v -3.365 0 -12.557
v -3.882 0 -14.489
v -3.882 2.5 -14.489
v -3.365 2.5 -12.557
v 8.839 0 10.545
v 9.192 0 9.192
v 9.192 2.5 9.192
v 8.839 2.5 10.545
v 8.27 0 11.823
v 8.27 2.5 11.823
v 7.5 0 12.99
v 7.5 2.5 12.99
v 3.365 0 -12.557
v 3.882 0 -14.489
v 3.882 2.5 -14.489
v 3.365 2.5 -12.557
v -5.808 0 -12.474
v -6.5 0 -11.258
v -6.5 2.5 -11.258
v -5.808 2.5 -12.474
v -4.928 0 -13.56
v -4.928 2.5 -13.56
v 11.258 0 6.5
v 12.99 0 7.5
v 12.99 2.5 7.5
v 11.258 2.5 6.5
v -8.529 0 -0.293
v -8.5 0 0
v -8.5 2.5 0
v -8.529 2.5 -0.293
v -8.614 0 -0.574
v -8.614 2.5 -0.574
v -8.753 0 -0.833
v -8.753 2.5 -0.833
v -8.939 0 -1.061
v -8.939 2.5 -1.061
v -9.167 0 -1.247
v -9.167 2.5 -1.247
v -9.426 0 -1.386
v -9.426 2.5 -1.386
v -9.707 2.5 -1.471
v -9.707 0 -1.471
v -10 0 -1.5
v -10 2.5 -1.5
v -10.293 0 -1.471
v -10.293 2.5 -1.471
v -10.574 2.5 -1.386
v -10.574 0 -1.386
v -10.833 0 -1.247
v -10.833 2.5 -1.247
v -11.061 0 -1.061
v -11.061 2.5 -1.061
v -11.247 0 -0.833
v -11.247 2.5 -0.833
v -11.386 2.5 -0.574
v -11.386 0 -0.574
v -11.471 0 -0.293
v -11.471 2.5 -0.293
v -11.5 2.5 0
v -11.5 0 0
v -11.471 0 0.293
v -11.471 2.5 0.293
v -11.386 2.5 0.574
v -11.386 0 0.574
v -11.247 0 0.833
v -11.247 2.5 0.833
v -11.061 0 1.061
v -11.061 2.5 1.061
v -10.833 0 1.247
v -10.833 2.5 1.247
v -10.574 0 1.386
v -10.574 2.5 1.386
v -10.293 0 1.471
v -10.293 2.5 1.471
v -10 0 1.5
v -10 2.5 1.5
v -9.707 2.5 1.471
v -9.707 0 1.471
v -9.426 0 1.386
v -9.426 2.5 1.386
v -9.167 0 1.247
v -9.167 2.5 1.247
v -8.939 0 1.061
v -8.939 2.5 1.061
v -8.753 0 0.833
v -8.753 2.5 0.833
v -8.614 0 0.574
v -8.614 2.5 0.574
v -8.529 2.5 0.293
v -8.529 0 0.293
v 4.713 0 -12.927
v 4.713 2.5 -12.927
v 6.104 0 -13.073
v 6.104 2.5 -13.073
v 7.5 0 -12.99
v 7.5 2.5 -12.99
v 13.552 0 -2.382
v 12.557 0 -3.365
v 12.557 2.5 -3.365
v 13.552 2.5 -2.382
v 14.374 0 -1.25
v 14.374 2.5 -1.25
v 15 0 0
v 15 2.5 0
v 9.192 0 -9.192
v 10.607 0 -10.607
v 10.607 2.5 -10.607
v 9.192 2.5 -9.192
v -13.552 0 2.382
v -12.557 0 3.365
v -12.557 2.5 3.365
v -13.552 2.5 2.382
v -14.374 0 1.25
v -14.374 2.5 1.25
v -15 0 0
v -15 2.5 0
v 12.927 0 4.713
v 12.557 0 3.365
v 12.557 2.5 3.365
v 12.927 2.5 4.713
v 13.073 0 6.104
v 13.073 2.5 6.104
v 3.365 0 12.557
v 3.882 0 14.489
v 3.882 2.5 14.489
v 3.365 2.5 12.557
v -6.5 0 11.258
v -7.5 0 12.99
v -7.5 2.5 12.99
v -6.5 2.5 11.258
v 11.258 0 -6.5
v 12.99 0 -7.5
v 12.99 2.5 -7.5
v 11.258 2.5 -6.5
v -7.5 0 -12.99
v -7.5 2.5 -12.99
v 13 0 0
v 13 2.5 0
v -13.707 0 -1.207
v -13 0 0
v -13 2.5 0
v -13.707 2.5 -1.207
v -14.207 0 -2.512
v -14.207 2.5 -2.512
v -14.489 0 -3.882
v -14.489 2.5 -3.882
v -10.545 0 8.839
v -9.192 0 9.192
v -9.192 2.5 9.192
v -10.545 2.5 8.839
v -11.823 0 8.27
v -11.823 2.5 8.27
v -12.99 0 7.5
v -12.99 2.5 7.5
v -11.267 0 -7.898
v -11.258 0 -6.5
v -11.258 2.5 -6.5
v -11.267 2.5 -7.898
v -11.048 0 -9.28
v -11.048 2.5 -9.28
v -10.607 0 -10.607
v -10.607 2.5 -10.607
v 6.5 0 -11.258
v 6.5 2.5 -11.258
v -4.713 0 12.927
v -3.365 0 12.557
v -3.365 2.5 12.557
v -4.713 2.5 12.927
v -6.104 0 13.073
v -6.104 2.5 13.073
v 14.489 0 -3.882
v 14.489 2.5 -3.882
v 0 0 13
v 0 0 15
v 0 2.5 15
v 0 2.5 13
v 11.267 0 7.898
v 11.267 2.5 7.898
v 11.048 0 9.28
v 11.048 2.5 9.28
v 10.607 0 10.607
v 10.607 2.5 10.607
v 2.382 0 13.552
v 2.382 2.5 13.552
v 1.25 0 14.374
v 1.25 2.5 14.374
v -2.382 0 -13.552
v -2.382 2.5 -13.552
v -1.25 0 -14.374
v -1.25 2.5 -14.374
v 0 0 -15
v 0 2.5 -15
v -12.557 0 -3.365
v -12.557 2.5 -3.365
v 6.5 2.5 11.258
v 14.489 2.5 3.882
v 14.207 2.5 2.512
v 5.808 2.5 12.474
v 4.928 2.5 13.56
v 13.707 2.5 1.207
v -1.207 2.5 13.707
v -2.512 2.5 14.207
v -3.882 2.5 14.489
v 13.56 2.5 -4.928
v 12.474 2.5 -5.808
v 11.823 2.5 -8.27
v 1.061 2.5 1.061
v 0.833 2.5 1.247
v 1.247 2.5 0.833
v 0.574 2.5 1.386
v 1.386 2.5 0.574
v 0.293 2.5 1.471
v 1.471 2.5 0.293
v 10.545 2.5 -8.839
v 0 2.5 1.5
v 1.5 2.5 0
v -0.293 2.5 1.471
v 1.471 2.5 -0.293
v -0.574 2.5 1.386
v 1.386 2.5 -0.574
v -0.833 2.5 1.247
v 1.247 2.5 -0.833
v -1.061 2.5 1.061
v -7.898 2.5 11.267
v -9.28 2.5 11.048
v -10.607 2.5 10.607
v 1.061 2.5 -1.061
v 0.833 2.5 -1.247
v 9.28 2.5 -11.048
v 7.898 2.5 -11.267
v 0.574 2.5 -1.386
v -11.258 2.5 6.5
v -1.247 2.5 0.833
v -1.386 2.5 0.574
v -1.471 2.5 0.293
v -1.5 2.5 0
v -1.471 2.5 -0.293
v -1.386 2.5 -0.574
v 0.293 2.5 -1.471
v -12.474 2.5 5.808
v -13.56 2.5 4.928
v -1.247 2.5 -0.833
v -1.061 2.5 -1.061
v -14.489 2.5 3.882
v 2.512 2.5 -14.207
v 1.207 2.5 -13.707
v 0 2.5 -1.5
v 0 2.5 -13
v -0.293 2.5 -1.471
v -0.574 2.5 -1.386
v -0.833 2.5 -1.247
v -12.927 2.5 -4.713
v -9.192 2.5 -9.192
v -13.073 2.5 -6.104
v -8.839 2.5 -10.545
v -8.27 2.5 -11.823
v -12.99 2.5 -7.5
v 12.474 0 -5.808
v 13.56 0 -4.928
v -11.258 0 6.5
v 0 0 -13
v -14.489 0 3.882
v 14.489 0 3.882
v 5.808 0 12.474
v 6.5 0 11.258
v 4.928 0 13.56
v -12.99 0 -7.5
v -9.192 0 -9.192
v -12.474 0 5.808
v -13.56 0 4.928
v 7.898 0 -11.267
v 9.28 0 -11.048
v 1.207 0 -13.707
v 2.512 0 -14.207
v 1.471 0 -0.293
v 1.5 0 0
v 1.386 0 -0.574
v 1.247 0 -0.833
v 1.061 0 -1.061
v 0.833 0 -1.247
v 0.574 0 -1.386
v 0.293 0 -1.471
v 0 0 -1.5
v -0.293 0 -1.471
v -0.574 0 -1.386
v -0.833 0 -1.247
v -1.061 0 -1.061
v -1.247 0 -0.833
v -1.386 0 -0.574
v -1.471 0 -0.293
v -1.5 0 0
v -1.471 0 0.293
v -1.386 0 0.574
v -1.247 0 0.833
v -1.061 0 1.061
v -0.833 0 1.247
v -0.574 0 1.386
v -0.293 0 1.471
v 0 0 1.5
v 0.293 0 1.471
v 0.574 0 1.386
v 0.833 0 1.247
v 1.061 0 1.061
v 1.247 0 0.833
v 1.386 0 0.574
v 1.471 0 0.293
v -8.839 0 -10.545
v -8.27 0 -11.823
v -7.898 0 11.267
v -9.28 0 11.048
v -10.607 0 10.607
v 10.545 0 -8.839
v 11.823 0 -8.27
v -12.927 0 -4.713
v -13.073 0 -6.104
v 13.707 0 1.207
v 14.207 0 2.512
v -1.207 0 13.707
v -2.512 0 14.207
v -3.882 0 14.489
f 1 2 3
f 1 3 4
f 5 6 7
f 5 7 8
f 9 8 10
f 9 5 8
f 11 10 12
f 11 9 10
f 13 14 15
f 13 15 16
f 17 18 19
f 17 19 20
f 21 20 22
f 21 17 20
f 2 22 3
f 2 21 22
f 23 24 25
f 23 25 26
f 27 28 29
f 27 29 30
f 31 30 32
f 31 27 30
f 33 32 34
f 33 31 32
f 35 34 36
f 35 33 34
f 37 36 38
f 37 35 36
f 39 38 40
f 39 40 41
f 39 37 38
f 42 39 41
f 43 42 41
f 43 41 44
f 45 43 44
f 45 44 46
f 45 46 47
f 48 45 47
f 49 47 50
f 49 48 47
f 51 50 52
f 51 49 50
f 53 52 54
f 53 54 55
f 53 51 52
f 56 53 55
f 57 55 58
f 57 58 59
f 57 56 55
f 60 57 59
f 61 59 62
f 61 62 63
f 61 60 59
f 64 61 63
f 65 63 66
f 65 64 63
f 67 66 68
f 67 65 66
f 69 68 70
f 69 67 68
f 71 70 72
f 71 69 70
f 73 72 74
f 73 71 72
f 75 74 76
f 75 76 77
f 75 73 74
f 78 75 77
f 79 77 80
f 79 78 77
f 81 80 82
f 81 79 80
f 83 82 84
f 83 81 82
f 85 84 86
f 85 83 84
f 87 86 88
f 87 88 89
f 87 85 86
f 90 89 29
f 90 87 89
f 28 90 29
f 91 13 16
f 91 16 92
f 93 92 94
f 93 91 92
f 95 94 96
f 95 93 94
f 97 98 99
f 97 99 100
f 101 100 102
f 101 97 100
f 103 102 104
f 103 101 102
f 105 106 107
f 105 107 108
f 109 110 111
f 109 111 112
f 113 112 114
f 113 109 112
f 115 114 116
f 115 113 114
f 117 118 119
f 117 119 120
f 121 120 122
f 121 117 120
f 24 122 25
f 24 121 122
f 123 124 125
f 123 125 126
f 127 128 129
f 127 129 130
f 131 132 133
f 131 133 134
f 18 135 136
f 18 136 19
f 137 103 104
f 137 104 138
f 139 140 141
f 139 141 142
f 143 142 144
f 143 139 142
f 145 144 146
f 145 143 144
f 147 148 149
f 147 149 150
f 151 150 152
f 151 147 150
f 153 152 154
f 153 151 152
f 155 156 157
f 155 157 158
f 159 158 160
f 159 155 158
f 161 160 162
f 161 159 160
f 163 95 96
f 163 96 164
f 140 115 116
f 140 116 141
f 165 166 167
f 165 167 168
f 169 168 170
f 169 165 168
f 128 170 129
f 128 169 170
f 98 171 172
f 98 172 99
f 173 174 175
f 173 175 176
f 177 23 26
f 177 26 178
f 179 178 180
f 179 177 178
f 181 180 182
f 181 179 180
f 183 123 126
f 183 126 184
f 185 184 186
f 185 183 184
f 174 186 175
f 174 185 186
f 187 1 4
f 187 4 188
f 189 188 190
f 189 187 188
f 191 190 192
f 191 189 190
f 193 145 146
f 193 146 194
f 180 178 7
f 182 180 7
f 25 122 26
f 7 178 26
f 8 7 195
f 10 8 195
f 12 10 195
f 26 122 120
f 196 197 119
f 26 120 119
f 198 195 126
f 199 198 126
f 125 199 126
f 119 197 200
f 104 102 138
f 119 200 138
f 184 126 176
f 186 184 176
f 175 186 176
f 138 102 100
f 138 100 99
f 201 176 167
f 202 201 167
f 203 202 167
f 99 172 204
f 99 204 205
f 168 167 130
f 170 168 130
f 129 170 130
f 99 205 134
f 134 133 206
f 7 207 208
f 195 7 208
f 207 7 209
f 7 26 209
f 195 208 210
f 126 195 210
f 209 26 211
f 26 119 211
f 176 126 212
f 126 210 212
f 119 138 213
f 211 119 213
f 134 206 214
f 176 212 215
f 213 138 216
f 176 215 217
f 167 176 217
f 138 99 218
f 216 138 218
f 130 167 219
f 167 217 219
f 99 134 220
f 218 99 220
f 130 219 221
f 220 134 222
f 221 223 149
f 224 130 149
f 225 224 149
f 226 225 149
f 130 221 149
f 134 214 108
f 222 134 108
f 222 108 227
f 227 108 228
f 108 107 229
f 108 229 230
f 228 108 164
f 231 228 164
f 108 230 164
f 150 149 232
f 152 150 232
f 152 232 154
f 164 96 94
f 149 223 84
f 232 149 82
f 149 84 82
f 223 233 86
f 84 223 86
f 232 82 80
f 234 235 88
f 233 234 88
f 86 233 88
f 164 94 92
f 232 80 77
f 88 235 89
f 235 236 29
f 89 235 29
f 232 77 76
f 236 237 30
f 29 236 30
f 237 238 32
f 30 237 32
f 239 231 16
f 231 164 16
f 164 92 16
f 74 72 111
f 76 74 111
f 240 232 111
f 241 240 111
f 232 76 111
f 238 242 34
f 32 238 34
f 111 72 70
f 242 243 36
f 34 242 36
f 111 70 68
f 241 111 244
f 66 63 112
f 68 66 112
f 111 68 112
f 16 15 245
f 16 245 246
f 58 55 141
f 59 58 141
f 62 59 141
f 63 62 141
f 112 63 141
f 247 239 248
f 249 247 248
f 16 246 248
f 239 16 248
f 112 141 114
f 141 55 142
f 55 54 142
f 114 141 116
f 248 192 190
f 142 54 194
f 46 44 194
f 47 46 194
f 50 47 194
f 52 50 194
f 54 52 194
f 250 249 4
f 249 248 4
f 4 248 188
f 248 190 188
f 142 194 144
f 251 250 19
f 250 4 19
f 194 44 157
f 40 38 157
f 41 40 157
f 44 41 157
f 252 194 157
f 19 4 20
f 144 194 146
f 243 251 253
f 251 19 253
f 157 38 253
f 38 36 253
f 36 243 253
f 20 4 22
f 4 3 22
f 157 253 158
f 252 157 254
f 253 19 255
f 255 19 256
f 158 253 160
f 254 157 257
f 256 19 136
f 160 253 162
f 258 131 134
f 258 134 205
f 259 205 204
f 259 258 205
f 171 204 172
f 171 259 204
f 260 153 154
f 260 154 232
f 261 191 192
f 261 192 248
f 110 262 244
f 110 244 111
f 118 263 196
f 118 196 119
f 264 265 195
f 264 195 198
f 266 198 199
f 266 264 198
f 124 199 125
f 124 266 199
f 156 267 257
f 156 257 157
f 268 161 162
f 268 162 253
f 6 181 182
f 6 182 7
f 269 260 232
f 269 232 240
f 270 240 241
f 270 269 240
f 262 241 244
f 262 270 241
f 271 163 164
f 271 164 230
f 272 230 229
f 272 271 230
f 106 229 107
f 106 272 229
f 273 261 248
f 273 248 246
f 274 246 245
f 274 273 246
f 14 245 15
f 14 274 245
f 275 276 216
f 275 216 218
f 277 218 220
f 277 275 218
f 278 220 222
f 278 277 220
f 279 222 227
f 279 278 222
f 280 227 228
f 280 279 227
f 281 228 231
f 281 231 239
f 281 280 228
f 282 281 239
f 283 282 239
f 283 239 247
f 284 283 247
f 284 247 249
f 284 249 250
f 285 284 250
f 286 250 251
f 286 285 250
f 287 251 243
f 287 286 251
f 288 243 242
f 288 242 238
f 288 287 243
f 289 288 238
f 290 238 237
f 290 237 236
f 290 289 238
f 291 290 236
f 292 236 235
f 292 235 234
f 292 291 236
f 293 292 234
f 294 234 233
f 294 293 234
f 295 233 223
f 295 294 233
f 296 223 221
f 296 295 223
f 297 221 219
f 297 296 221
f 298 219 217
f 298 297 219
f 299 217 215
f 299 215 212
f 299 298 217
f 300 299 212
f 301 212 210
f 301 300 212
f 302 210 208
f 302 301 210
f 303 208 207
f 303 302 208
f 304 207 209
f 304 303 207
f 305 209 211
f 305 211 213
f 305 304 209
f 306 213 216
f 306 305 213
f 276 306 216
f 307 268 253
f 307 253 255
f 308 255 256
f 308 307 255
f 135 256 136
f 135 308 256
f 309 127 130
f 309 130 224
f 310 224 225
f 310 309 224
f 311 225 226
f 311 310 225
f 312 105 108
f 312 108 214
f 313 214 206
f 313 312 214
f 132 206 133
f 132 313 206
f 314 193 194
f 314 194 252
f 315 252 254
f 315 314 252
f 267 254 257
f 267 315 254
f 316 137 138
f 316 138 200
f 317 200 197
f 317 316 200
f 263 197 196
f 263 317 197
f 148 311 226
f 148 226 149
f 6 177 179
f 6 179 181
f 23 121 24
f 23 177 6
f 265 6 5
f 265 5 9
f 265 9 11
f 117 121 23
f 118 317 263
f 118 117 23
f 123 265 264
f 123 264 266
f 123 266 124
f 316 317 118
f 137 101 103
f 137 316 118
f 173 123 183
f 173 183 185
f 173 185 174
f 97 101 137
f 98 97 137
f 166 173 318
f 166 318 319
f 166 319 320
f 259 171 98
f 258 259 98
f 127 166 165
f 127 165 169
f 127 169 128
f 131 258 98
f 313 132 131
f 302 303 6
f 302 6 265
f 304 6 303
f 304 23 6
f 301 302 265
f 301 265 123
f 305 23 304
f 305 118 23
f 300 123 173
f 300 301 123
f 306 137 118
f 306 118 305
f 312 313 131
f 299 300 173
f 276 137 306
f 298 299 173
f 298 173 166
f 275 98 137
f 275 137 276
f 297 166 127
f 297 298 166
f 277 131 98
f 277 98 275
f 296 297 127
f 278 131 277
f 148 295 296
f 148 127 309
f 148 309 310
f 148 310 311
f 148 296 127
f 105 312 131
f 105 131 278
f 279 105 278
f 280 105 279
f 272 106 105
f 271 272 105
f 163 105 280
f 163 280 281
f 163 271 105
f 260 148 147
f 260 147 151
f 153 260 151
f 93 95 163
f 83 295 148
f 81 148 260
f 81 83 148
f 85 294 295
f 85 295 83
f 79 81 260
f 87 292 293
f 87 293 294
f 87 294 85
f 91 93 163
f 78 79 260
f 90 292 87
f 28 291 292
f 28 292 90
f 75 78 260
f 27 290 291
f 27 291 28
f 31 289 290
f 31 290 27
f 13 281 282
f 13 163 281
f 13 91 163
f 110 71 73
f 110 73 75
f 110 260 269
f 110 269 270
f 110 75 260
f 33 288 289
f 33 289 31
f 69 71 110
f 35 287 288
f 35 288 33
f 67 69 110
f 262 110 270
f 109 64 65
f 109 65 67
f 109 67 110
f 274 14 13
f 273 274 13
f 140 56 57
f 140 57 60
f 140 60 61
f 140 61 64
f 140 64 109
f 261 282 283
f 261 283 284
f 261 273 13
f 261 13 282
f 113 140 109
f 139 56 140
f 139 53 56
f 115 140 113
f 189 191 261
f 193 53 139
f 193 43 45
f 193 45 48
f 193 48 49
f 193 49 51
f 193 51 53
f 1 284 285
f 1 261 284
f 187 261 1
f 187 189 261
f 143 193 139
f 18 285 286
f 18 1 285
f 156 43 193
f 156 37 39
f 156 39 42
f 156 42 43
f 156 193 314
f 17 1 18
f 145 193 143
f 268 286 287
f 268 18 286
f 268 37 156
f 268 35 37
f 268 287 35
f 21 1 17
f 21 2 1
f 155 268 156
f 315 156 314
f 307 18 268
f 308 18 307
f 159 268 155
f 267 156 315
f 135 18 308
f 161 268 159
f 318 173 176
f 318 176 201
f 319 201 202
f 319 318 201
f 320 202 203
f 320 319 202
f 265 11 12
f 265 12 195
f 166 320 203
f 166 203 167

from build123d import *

# Parameters (mm, degrees)
SKETCH_1_R      = 1.5
EXTRUDE_1_DEPTH = 2.5


with BuildPart() as part:
    # 草图1 → 凸台-拉伸1 (new body)
    with BuildSketch(Plane(origin=(0, 0, 0), x_dir=(1, 0, 0), z_dir=(0, 1, 0))):
        with BuildLine():
            Line((3.882285677, 14.488887394), (3.364647586, 12.557035742))
            ThreePointArc((3.364647586, 12.557035742), (5.405611466, 13.028620317), (7.5, 12.990381057))
            Line((7.5, 12.990381057), (6.5, 11.258330249))
            ThreePointArc((6.5, 11.258330249), (8.593474792, 11.185605648), (10.606601718, 10.606601718))
            Line((10.606601718, 10.606601718), (9.192388155, 9.192388155))
            ThreePointArc((9.192388155, 9.192388155), (11.195707011, 8.580310438), (12.990381057, 7.5))
            Line((12.990381057, 7.5), (11.258330249, 6.5))
            ThreePointArc((11.258330249, 6.5), (13.0349703, 5.390281252), (14.488887394, 3.882285677))
            Line((14.488887394, 3.882285677), (12.557035742, 3.364647586))
            ThreePointArc((12.557035742, 3.364647586), (13.985921904, 1.832913306), (15, 0))
            Line((15, 0), (13, 0))
            ThreePointArc((13, 0), (13.983756043, -1.849364653), (14.488887394, -3.882285677))
            Line((14.488887394, -3.882285677), (12.557035742, -3.364647586))
            ThreePointArc((12.557035742, -3.364647586), (13.028620317, -5.405611466), (12.990381057, -7.5))
            Line((12.990381057, -7.5), (11.258330249, -6.5))
            ThreePointArc((11.258330249, -6.5), (11.185605648, -8.593474792), (10.606601718, -10.606601718))
            Line((10.606601718, -10.606601718), (9.192388155, -9.192388155))
            ThreePointArc((9.192388155, -9.192388155), (8.580310438, -11.195707011), (7.5, -12.990381057))
            Line((7.5, -12.990381057), (6.5, -11.258330249))
            ThreePointArc((6.5, -11.258330249), (5.390281252, -13.0349703), (3.882285677, -14.488887394))
            Line((3.882285677, -14.488887394), (3.364647586, -12.557035742))
            ThreePointArc((3.364647586, -12.557035742), (1.832913306, -13.985921904), (0, -15))
            Line((0, -15), (0, -13))
            ThreePointArc((0, -13), (-1.849364653, -13.983756043), (-3.882285677, -14.488887394))
            Line((-3.882285677, -14.488887394), (-3.364647586, -12.557035742))
            ThreePointArc((-3.364647586, -12.557035742), (-5.405611466, -13.028620317), (-7.5, -12.990381057))
            Line((-7.5, -12.990381057), (-6.5, -11.258330249))
            ThreePointArc((-6.5, -11.258330249), (-8.593474792, -11.185605648), (-10.606601718, -10.606601718))
            Line((-10.606601718, -10.606601718), (-9.192388155, -9.192388155))
            ThreePointArc((-9.192388155, -9.192388155), (-11.195707011, -8.580310438), (-12.990381057, -7.5))
            Line((-12.990381057, -7.5), (-11.258330249, -6.5))
            ThreePointArc((-11.258330249, -6.5), (-13.0349703, -5.390281252), (-14.488887394, -3.882285677))
            Line((-14.488887394, -3.882285677), (-12.557035742, -3.364647586))
            ThreePointArc((-12.557035742, -3.364647586), (-13.985921904, -1.832913306), (-15, 0))
            Line((-15, 0), (-13, 0))
            ThreePointArc((-13, 0), (-13.983756043, 1.849364653), (-14.488887394, 3.882285677))
            Line((-14.488887394, 3.882285677), (-12.557035742, 3.364647586))
            ThreePointArc((-12.557035742, 3.364647586), (-13.028620317, 5.405611466), (-12.990381057, 7.5))
            Line((-12.990381057, 7.5), (-11.258330249, 6.5))
            ThreePointArc((-11.258330249, 6.5), (-11.185605648, 8.593474792), (-10.606601718, 10.606601718))
            Line((-10.606601718, 10.606601718), (-9.192388155, 9.192388155))
            ThreePointArc((-9.192388155, 9.192388155), (-8.580310438, 11.195707011), (-7.5, 12.990381057))
            Line((-7.5, 12.990381057), (-6.5, 11.258330249))
            ThreePointArc((-6.5, 11.258330249), (-5.390281252, 13.0349703), (-3.882285677, 14.488887394))
            Line((-3.882285677, 14.488887394), (-3.364647586, 12.557035742))
            ThreePointArc((-3.364647586, 12.557035742), (-1.832913306, 13.985921904), (0, 15))
            Line((0, 15), (0, 13))
            ThreePointArc((0, 13), (1.849364653, 13.983756043), (3.882285677, 14.488887394))
        make_face()
        with Locations((-10, 0)):
            Circle(SKETCH_1_R, mode=Mode.SUBTRACT)
        Circle(SKETCH_1_R, mode=Mode.SUBTRACT)
    extrude(amount=EXTRUDE_1_DEPTH)


solid = part.part
